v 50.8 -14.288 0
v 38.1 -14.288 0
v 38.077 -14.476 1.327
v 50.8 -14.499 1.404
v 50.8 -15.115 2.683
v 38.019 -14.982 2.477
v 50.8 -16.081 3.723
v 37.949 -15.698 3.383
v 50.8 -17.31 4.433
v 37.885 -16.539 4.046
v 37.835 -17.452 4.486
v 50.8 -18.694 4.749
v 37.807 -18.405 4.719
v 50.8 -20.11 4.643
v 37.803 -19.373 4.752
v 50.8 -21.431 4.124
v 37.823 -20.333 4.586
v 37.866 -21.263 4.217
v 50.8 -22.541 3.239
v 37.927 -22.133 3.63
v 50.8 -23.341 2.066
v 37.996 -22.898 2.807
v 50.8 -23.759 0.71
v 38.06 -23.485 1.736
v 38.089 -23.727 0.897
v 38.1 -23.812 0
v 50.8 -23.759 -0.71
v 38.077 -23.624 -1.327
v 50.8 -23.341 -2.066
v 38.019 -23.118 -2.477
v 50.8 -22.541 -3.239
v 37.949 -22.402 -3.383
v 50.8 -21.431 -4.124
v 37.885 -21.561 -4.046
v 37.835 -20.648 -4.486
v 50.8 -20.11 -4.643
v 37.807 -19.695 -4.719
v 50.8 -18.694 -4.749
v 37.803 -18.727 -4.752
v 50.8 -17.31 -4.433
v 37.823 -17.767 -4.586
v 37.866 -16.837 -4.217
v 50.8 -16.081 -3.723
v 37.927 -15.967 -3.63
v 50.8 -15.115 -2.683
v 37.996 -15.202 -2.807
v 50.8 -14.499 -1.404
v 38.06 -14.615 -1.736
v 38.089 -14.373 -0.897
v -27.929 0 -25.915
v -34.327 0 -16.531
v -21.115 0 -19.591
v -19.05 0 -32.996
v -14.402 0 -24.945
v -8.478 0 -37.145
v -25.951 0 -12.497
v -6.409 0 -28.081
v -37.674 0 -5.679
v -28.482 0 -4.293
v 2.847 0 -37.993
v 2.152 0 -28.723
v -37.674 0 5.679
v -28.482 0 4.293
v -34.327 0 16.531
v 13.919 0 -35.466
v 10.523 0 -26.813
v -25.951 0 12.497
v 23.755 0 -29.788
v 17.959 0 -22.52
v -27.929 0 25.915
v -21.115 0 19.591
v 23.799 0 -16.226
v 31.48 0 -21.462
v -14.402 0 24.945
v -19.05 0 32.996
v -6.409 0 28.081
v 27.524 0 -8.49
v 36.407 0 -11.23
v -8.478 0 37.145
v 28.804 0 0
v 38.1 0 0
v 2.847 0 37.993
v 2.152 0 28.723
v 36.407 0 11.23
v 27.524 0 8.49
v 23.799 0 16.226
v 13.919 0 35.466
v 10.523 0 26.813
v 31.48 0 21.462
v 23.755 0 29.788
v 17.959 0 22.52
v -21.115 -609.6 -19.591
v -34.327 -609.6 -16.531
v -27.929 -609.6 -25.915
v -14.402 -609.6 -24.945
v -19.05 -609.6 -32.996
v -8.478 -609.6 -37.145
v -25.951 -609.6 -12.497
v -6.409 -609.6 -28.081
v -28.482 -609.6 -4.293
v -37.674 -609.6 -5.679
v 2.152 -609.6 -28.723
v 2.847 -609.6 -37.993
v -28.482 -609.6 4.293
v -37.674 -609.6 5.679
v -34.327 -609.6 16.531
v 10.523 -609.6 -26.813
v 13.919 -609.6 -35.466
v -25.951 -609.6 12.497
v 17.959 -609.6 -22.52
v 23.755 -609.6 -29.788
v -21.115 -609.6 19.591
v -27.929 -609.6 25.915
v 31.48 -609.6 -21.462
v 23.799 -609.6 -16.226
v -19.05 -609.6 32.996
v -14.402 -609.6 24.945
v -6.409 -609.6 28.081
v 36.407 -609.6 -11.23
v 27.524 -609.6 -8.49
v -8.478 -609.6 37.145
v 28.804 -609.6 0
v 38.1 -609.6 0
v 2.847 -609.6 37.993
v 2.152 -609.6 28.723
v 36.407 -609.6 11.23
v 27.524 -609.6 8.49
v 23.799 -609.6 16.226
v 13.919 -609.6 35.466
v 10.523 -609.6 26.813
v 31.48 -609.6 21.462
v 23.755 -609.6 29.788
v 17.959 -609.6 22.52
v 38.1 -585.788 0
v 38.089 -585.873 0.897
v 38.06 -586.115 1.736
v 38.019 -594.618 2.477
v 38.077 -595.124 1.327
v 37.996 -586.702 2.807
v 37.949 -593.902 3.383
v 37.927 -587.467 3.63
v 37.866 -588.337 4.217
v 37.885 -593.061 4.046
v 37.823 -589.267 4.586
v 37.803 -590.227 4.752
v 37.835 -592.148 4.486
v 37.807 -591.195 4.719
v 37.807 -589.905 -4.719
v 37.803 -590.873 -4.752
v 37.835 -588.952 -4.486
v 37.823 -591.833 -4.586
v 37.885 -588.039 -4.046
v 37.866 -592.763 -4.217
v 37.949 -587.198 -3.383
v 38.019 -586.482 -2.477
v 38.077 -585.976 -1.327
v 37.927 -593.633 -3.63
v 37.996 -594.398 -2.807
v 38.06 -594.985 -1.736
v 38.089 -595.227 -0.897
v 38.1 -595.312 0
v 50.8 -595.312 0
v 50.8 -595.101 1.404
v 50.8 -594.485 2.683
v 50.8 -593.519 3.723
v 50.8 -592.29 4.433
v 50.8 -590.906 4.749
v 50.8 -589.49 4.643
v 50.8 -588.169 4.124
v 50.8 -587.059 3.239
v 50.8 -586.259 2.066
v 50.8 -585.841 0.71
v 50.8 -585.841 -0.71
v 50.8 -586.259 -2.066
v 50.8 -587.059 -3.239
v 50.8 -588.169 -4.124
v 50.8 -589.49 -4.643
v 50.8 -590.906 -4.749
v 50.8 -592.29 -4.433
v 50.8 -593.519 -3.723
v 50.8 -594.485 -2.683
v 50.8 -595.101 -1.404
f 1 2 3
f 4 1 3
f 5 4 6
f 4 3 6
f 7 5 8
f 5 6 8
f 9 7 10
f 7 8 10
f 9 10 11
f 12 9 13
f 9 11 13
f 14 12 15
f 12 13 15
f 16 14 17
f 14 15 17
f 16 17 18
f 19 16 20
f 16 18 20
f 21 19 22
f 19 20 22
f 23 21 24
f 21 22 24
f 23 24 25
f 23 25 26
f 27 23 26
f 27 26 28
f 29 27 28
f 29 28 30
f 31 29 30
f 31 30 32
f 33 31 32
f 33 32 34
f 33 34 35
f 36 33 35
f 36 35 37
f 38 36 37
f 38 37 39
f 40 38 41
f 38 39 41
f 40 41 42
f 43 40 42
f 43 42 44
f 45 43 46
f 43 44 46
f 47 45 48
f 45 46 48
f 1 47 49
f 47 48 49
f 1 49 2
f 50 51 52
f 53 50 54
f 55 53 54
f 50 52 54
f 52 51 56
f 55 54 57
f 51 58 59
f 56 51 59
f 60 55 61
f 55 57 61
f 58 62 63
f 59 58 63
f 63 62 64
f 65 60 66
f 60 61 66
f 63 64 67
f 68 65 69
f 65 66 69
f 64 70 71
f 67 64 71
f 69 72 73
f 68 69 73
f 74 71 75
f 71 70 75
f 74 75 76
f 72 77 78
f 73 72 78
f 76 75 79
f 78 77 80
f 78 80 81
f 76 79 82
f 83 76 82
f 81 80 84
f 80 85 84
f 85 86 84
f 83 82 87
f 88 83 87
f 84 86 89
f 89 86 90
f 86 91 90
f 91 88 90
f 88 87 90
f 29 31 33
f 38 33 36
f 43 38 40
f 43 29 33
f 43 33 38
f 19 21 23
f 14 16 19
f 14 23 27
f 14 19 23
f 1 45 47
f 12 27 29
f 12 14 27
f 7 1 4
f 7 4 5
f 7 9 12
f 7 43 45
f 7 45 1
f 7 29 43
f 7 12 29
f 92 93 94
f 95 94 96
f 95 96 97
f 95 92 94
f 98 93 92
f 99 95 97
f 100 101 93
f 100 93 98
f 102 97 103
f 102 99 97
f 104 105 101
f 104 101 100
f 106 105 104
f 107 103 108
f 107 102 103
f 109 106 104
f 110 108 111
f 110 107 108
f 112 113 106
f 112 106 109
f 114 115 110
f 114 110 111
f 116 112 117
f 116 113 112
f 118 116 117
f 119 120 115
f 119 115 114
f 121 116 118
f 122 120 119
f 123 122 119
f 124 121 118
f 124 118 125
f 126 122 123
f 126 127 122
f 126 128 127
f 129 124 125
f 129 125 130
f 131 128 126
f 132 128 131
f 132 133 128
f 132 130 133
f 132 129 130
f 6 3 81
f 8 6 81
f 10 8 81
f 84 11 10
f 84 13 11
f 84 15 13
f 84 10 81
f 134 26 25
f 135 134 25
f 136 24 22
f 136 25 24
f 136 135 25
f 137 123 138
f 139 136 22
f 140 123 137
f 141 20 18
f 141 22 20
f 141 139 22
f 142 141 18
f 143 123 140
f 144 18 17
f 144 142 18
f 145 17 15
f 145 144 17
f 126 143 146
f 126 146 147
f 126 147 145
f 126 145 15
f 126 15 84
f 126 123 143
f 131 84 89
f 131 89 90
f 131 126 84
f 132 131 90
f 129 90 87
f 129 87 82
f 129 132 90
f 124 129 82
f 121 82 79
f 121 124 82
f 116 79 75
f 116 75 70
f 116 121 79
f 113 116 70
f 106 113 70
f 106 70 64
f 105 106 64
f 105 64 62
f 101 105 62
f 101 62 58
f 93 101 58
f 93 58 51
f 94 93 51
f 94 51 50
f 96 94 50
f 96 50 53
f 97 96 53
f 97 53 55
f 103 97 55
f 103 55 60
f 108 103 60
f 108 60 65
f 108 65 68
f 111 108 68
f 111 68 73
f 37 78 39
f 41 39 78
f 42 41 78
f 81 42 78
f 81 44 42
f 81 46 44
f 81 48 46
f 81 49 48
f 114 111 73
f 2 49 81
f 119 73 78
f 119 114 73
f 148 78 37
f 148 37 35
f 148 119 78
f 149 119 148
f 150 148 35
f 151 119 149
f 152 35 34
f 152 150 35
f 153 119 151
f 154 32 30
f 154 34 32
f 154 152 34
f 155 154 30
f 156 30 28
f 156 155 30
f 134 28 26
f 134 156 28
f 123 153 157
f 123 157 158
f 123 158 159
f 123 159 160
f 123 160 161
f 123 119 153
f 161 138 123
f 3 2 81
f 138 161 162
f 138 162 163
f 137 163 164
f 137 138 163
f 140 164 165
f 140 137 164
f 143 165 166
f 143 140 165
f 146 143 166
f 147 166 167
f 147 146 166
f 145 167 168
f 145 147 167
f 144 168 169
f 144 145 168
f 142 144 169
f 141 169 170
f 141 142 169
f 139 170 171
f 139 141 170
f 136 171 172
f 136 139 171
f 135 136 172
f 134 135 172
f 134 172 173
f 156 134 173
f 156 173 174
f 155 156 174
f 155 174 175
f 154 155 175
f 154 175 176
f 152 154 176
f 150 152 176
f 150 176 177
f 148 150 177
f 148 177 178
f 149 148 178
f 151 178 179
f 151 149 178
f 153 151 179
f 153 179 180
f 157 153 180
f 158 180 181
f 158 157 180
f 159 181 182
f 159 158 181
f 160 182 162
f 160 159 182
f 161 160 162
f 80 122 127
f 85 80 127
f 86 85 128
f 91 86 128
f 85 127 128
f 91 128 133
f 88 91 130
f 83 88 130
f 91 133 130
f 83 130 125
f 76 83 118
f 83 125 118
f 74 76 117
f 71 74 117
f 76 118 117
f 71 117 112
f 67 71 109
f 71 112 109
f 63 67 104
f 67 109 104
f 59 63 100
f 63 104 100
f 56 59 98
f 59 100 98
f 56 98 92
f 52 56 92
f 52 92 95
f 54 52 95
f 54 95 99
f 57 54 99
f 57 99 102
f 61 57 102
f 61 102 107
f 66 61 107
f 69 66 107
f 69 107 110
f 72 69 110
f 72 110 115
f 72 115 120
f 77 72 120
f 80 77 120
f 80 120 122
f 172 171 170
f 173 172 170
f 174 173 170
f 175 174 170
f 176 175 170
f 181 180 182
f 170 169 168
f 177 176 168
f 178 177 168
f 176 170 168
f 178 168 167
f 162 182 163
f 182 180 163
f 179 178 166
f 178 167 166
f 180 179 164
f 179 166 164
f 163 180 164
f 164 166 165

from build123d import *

# Parameters (mm, degrees)
F1_R     = 4.7625
F2_DEPTH = 50.8
F0_R     = 38.1
F0_R_2   = 28.8036
F3_DEPTH = 304.8
F4_DEPTH = 304.8


with BuildPart() as f2:
    # F1 (on Right) → F2 (new body)
    with BuildSketch(Plane.YZ):
        with Locations((-19.05, 0)):
            Circle(F1_R)
    extrude(amount=F2_DEPTH)

    # F0 (on Front) → F3 (join)
    with BuildSketch(Plane.XZ):
        Circle(F0_R)
        Circle(F0_R_2, mode=Mode.SUBTRACT)
        Circle(F0_R_2)
    extrude(amount=F3_DEPTH)

    # F0 (on Front) → F4 (cut)
    with BuildSketch(Plane.XZ):
        Circle(F0_R_2)
    extrude(amount=F4_DEPTH, mode=Mode.SUBTRACT)

    # F5: F2 across face


with BuildPart() as f2_1:
    add(f2.part)
    add(f2.part.mirror(Plane.XZ.offset(304.8)))


solid = f2_1.part
